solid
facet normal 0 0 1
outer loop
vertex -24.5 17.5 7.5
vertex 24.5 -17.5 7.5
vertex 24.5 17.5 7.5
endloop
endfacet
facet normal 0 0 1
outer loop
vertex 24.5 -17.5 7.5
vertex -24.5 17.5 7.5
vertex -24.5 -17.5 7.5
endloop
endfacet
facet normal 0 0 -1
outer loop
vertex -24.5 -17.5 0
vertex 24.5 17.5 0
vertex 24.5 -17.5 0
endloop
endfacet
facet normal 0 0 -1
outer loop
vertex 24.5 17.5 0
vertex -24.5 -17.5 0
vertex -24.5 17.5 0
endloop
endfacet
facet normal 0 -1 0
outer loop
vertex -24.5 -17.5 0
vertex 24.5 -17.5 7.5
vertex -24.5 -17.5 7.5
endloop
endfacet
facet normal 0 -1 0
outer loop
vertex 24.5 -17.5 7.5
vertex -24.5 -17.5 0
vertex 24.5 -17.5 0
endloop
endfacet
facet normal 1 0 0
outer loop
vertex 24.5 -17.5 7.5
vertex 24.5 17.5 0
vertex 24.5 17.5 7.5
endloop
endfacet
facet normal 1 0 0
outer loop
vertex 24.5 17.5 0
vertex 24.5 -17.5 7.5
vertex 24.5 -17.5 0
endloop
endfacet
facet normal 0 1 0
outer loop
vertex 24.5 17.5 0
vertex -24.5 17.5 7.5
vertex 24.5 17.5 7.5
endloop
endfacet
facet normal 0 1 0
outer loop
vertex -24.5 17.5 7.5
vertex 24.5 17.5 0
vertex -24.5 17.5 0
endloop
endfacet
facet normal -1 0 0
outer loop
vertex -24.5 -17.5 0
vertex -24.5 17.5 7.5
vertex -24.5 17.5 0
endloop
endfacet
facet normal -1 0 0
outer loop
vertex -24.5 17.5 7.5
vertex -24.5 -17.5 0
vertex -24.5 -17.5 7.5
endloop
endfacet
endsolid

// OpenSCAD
// file: ../machine.scad
/*
 * Helpers for machinging; i.e. kerf alowances
 *
 * Copyright 2013 <b@Zi.iS>
 * License CC BY 3.0
 */

include <main.scad>;

ZCUT = 0;
XOFF = 0;
YOFF = 0;

module drawing() {
	//create blueprint
	if(preview==0) {
		projection(cut=true) translate([
			XOFF,
			YOFF,
			ZCUT
		]) {
			for(i=[0:$children-1]) child(i);
		}
	} else {
		for(i=[0:$children-1]) child(i);
	}
}

module kerf_cube(
	size
) {
	translate([
		kerf/2*(1-preview),
		kerf/2*(1-preview),
		0
	]) {
		cube([
			size[0] - kerf*(1-preview),
			size[1] - kerf*(1-preview),
			size[2]
		]);
	}
}

module kerf_cylinder(
	r,
	h
) {
	cylinder(
		r = r - kerf/2*(1-preview),
		h = h
	);
}

module part(
	id,
	name
) {
	if(PART<1 || PART==id) {
		echo(str("PART", id, ":", name));
		for(i=[0:$children-1]) child(i);
	}	
}
// file: ../easing.scad
/*
 * Make allowances to ensure good fit.
 *
 * Copyright 2013 <b@Zi.iS>
 * License CC BY 3.0
 */

function ease(value) = min(value*1.1, value + .2);
// file: ../epslion.scad
/*
 * Slightly offset previews to overcome rounding issues
 *
 * Copyright 2013 <b@Zi.iS>
 * License CC BY 3.0
 */

include <config.scad>;

module e(
	shift = -.1,
	size = 1.1
) {
	if(preview == 1) {
		translate([
			0,
			0,
			shift
		]) {
			scale([
				1,
				1,
				size
			]) {
				if($children>0) for (i = [0 : $children-1]) child(i);
			}
		}
	} else {
		if($children>0) for (i = [0 : $children-1]) child(i);
	}
}
// file: ../config.scad
/*
 * Default settings
 *
 * Copyright 2013 <b@Zi.iS>
 * License CC BY 3.0
 */

preview = 1;
$fa = 6;
$fs = 2 - 1.5*(1-preview);
kerf = .2;
PART = 0; //all

// preview colors
color_steel = [.8, .8, .8];
color_wood = [.3, .3, 0];
color_print = [0, .8, 0];
color_plastic = [.7, 1, .7];
// file: ../main.scad
/*
 * A library to make SCAD easier.
 *
 * Copyright 2013 <b@Zi.iS>
 * License CC BY 3.0
 */

include <config.scad>;
use <epslion.scad>;
use <easing.scad>;
use <machine.scad>;
// main file
/*
 * lipo
 *
 * Copyright 2013 b@Zi.iS
 *
 * License CC BY 3.0
 */

include <../main.scad>;

lipo();

module lipo(
	size = [
		49,
		35,
		7.5
	],
	id
) {
	part(id, str("lipo cell"))

	color([.25,.25,.25]) {
		translate([
			-size[0]/2,
			-size[1]/2,
			0
		]) {
			cube(size);
		}
	}
}
